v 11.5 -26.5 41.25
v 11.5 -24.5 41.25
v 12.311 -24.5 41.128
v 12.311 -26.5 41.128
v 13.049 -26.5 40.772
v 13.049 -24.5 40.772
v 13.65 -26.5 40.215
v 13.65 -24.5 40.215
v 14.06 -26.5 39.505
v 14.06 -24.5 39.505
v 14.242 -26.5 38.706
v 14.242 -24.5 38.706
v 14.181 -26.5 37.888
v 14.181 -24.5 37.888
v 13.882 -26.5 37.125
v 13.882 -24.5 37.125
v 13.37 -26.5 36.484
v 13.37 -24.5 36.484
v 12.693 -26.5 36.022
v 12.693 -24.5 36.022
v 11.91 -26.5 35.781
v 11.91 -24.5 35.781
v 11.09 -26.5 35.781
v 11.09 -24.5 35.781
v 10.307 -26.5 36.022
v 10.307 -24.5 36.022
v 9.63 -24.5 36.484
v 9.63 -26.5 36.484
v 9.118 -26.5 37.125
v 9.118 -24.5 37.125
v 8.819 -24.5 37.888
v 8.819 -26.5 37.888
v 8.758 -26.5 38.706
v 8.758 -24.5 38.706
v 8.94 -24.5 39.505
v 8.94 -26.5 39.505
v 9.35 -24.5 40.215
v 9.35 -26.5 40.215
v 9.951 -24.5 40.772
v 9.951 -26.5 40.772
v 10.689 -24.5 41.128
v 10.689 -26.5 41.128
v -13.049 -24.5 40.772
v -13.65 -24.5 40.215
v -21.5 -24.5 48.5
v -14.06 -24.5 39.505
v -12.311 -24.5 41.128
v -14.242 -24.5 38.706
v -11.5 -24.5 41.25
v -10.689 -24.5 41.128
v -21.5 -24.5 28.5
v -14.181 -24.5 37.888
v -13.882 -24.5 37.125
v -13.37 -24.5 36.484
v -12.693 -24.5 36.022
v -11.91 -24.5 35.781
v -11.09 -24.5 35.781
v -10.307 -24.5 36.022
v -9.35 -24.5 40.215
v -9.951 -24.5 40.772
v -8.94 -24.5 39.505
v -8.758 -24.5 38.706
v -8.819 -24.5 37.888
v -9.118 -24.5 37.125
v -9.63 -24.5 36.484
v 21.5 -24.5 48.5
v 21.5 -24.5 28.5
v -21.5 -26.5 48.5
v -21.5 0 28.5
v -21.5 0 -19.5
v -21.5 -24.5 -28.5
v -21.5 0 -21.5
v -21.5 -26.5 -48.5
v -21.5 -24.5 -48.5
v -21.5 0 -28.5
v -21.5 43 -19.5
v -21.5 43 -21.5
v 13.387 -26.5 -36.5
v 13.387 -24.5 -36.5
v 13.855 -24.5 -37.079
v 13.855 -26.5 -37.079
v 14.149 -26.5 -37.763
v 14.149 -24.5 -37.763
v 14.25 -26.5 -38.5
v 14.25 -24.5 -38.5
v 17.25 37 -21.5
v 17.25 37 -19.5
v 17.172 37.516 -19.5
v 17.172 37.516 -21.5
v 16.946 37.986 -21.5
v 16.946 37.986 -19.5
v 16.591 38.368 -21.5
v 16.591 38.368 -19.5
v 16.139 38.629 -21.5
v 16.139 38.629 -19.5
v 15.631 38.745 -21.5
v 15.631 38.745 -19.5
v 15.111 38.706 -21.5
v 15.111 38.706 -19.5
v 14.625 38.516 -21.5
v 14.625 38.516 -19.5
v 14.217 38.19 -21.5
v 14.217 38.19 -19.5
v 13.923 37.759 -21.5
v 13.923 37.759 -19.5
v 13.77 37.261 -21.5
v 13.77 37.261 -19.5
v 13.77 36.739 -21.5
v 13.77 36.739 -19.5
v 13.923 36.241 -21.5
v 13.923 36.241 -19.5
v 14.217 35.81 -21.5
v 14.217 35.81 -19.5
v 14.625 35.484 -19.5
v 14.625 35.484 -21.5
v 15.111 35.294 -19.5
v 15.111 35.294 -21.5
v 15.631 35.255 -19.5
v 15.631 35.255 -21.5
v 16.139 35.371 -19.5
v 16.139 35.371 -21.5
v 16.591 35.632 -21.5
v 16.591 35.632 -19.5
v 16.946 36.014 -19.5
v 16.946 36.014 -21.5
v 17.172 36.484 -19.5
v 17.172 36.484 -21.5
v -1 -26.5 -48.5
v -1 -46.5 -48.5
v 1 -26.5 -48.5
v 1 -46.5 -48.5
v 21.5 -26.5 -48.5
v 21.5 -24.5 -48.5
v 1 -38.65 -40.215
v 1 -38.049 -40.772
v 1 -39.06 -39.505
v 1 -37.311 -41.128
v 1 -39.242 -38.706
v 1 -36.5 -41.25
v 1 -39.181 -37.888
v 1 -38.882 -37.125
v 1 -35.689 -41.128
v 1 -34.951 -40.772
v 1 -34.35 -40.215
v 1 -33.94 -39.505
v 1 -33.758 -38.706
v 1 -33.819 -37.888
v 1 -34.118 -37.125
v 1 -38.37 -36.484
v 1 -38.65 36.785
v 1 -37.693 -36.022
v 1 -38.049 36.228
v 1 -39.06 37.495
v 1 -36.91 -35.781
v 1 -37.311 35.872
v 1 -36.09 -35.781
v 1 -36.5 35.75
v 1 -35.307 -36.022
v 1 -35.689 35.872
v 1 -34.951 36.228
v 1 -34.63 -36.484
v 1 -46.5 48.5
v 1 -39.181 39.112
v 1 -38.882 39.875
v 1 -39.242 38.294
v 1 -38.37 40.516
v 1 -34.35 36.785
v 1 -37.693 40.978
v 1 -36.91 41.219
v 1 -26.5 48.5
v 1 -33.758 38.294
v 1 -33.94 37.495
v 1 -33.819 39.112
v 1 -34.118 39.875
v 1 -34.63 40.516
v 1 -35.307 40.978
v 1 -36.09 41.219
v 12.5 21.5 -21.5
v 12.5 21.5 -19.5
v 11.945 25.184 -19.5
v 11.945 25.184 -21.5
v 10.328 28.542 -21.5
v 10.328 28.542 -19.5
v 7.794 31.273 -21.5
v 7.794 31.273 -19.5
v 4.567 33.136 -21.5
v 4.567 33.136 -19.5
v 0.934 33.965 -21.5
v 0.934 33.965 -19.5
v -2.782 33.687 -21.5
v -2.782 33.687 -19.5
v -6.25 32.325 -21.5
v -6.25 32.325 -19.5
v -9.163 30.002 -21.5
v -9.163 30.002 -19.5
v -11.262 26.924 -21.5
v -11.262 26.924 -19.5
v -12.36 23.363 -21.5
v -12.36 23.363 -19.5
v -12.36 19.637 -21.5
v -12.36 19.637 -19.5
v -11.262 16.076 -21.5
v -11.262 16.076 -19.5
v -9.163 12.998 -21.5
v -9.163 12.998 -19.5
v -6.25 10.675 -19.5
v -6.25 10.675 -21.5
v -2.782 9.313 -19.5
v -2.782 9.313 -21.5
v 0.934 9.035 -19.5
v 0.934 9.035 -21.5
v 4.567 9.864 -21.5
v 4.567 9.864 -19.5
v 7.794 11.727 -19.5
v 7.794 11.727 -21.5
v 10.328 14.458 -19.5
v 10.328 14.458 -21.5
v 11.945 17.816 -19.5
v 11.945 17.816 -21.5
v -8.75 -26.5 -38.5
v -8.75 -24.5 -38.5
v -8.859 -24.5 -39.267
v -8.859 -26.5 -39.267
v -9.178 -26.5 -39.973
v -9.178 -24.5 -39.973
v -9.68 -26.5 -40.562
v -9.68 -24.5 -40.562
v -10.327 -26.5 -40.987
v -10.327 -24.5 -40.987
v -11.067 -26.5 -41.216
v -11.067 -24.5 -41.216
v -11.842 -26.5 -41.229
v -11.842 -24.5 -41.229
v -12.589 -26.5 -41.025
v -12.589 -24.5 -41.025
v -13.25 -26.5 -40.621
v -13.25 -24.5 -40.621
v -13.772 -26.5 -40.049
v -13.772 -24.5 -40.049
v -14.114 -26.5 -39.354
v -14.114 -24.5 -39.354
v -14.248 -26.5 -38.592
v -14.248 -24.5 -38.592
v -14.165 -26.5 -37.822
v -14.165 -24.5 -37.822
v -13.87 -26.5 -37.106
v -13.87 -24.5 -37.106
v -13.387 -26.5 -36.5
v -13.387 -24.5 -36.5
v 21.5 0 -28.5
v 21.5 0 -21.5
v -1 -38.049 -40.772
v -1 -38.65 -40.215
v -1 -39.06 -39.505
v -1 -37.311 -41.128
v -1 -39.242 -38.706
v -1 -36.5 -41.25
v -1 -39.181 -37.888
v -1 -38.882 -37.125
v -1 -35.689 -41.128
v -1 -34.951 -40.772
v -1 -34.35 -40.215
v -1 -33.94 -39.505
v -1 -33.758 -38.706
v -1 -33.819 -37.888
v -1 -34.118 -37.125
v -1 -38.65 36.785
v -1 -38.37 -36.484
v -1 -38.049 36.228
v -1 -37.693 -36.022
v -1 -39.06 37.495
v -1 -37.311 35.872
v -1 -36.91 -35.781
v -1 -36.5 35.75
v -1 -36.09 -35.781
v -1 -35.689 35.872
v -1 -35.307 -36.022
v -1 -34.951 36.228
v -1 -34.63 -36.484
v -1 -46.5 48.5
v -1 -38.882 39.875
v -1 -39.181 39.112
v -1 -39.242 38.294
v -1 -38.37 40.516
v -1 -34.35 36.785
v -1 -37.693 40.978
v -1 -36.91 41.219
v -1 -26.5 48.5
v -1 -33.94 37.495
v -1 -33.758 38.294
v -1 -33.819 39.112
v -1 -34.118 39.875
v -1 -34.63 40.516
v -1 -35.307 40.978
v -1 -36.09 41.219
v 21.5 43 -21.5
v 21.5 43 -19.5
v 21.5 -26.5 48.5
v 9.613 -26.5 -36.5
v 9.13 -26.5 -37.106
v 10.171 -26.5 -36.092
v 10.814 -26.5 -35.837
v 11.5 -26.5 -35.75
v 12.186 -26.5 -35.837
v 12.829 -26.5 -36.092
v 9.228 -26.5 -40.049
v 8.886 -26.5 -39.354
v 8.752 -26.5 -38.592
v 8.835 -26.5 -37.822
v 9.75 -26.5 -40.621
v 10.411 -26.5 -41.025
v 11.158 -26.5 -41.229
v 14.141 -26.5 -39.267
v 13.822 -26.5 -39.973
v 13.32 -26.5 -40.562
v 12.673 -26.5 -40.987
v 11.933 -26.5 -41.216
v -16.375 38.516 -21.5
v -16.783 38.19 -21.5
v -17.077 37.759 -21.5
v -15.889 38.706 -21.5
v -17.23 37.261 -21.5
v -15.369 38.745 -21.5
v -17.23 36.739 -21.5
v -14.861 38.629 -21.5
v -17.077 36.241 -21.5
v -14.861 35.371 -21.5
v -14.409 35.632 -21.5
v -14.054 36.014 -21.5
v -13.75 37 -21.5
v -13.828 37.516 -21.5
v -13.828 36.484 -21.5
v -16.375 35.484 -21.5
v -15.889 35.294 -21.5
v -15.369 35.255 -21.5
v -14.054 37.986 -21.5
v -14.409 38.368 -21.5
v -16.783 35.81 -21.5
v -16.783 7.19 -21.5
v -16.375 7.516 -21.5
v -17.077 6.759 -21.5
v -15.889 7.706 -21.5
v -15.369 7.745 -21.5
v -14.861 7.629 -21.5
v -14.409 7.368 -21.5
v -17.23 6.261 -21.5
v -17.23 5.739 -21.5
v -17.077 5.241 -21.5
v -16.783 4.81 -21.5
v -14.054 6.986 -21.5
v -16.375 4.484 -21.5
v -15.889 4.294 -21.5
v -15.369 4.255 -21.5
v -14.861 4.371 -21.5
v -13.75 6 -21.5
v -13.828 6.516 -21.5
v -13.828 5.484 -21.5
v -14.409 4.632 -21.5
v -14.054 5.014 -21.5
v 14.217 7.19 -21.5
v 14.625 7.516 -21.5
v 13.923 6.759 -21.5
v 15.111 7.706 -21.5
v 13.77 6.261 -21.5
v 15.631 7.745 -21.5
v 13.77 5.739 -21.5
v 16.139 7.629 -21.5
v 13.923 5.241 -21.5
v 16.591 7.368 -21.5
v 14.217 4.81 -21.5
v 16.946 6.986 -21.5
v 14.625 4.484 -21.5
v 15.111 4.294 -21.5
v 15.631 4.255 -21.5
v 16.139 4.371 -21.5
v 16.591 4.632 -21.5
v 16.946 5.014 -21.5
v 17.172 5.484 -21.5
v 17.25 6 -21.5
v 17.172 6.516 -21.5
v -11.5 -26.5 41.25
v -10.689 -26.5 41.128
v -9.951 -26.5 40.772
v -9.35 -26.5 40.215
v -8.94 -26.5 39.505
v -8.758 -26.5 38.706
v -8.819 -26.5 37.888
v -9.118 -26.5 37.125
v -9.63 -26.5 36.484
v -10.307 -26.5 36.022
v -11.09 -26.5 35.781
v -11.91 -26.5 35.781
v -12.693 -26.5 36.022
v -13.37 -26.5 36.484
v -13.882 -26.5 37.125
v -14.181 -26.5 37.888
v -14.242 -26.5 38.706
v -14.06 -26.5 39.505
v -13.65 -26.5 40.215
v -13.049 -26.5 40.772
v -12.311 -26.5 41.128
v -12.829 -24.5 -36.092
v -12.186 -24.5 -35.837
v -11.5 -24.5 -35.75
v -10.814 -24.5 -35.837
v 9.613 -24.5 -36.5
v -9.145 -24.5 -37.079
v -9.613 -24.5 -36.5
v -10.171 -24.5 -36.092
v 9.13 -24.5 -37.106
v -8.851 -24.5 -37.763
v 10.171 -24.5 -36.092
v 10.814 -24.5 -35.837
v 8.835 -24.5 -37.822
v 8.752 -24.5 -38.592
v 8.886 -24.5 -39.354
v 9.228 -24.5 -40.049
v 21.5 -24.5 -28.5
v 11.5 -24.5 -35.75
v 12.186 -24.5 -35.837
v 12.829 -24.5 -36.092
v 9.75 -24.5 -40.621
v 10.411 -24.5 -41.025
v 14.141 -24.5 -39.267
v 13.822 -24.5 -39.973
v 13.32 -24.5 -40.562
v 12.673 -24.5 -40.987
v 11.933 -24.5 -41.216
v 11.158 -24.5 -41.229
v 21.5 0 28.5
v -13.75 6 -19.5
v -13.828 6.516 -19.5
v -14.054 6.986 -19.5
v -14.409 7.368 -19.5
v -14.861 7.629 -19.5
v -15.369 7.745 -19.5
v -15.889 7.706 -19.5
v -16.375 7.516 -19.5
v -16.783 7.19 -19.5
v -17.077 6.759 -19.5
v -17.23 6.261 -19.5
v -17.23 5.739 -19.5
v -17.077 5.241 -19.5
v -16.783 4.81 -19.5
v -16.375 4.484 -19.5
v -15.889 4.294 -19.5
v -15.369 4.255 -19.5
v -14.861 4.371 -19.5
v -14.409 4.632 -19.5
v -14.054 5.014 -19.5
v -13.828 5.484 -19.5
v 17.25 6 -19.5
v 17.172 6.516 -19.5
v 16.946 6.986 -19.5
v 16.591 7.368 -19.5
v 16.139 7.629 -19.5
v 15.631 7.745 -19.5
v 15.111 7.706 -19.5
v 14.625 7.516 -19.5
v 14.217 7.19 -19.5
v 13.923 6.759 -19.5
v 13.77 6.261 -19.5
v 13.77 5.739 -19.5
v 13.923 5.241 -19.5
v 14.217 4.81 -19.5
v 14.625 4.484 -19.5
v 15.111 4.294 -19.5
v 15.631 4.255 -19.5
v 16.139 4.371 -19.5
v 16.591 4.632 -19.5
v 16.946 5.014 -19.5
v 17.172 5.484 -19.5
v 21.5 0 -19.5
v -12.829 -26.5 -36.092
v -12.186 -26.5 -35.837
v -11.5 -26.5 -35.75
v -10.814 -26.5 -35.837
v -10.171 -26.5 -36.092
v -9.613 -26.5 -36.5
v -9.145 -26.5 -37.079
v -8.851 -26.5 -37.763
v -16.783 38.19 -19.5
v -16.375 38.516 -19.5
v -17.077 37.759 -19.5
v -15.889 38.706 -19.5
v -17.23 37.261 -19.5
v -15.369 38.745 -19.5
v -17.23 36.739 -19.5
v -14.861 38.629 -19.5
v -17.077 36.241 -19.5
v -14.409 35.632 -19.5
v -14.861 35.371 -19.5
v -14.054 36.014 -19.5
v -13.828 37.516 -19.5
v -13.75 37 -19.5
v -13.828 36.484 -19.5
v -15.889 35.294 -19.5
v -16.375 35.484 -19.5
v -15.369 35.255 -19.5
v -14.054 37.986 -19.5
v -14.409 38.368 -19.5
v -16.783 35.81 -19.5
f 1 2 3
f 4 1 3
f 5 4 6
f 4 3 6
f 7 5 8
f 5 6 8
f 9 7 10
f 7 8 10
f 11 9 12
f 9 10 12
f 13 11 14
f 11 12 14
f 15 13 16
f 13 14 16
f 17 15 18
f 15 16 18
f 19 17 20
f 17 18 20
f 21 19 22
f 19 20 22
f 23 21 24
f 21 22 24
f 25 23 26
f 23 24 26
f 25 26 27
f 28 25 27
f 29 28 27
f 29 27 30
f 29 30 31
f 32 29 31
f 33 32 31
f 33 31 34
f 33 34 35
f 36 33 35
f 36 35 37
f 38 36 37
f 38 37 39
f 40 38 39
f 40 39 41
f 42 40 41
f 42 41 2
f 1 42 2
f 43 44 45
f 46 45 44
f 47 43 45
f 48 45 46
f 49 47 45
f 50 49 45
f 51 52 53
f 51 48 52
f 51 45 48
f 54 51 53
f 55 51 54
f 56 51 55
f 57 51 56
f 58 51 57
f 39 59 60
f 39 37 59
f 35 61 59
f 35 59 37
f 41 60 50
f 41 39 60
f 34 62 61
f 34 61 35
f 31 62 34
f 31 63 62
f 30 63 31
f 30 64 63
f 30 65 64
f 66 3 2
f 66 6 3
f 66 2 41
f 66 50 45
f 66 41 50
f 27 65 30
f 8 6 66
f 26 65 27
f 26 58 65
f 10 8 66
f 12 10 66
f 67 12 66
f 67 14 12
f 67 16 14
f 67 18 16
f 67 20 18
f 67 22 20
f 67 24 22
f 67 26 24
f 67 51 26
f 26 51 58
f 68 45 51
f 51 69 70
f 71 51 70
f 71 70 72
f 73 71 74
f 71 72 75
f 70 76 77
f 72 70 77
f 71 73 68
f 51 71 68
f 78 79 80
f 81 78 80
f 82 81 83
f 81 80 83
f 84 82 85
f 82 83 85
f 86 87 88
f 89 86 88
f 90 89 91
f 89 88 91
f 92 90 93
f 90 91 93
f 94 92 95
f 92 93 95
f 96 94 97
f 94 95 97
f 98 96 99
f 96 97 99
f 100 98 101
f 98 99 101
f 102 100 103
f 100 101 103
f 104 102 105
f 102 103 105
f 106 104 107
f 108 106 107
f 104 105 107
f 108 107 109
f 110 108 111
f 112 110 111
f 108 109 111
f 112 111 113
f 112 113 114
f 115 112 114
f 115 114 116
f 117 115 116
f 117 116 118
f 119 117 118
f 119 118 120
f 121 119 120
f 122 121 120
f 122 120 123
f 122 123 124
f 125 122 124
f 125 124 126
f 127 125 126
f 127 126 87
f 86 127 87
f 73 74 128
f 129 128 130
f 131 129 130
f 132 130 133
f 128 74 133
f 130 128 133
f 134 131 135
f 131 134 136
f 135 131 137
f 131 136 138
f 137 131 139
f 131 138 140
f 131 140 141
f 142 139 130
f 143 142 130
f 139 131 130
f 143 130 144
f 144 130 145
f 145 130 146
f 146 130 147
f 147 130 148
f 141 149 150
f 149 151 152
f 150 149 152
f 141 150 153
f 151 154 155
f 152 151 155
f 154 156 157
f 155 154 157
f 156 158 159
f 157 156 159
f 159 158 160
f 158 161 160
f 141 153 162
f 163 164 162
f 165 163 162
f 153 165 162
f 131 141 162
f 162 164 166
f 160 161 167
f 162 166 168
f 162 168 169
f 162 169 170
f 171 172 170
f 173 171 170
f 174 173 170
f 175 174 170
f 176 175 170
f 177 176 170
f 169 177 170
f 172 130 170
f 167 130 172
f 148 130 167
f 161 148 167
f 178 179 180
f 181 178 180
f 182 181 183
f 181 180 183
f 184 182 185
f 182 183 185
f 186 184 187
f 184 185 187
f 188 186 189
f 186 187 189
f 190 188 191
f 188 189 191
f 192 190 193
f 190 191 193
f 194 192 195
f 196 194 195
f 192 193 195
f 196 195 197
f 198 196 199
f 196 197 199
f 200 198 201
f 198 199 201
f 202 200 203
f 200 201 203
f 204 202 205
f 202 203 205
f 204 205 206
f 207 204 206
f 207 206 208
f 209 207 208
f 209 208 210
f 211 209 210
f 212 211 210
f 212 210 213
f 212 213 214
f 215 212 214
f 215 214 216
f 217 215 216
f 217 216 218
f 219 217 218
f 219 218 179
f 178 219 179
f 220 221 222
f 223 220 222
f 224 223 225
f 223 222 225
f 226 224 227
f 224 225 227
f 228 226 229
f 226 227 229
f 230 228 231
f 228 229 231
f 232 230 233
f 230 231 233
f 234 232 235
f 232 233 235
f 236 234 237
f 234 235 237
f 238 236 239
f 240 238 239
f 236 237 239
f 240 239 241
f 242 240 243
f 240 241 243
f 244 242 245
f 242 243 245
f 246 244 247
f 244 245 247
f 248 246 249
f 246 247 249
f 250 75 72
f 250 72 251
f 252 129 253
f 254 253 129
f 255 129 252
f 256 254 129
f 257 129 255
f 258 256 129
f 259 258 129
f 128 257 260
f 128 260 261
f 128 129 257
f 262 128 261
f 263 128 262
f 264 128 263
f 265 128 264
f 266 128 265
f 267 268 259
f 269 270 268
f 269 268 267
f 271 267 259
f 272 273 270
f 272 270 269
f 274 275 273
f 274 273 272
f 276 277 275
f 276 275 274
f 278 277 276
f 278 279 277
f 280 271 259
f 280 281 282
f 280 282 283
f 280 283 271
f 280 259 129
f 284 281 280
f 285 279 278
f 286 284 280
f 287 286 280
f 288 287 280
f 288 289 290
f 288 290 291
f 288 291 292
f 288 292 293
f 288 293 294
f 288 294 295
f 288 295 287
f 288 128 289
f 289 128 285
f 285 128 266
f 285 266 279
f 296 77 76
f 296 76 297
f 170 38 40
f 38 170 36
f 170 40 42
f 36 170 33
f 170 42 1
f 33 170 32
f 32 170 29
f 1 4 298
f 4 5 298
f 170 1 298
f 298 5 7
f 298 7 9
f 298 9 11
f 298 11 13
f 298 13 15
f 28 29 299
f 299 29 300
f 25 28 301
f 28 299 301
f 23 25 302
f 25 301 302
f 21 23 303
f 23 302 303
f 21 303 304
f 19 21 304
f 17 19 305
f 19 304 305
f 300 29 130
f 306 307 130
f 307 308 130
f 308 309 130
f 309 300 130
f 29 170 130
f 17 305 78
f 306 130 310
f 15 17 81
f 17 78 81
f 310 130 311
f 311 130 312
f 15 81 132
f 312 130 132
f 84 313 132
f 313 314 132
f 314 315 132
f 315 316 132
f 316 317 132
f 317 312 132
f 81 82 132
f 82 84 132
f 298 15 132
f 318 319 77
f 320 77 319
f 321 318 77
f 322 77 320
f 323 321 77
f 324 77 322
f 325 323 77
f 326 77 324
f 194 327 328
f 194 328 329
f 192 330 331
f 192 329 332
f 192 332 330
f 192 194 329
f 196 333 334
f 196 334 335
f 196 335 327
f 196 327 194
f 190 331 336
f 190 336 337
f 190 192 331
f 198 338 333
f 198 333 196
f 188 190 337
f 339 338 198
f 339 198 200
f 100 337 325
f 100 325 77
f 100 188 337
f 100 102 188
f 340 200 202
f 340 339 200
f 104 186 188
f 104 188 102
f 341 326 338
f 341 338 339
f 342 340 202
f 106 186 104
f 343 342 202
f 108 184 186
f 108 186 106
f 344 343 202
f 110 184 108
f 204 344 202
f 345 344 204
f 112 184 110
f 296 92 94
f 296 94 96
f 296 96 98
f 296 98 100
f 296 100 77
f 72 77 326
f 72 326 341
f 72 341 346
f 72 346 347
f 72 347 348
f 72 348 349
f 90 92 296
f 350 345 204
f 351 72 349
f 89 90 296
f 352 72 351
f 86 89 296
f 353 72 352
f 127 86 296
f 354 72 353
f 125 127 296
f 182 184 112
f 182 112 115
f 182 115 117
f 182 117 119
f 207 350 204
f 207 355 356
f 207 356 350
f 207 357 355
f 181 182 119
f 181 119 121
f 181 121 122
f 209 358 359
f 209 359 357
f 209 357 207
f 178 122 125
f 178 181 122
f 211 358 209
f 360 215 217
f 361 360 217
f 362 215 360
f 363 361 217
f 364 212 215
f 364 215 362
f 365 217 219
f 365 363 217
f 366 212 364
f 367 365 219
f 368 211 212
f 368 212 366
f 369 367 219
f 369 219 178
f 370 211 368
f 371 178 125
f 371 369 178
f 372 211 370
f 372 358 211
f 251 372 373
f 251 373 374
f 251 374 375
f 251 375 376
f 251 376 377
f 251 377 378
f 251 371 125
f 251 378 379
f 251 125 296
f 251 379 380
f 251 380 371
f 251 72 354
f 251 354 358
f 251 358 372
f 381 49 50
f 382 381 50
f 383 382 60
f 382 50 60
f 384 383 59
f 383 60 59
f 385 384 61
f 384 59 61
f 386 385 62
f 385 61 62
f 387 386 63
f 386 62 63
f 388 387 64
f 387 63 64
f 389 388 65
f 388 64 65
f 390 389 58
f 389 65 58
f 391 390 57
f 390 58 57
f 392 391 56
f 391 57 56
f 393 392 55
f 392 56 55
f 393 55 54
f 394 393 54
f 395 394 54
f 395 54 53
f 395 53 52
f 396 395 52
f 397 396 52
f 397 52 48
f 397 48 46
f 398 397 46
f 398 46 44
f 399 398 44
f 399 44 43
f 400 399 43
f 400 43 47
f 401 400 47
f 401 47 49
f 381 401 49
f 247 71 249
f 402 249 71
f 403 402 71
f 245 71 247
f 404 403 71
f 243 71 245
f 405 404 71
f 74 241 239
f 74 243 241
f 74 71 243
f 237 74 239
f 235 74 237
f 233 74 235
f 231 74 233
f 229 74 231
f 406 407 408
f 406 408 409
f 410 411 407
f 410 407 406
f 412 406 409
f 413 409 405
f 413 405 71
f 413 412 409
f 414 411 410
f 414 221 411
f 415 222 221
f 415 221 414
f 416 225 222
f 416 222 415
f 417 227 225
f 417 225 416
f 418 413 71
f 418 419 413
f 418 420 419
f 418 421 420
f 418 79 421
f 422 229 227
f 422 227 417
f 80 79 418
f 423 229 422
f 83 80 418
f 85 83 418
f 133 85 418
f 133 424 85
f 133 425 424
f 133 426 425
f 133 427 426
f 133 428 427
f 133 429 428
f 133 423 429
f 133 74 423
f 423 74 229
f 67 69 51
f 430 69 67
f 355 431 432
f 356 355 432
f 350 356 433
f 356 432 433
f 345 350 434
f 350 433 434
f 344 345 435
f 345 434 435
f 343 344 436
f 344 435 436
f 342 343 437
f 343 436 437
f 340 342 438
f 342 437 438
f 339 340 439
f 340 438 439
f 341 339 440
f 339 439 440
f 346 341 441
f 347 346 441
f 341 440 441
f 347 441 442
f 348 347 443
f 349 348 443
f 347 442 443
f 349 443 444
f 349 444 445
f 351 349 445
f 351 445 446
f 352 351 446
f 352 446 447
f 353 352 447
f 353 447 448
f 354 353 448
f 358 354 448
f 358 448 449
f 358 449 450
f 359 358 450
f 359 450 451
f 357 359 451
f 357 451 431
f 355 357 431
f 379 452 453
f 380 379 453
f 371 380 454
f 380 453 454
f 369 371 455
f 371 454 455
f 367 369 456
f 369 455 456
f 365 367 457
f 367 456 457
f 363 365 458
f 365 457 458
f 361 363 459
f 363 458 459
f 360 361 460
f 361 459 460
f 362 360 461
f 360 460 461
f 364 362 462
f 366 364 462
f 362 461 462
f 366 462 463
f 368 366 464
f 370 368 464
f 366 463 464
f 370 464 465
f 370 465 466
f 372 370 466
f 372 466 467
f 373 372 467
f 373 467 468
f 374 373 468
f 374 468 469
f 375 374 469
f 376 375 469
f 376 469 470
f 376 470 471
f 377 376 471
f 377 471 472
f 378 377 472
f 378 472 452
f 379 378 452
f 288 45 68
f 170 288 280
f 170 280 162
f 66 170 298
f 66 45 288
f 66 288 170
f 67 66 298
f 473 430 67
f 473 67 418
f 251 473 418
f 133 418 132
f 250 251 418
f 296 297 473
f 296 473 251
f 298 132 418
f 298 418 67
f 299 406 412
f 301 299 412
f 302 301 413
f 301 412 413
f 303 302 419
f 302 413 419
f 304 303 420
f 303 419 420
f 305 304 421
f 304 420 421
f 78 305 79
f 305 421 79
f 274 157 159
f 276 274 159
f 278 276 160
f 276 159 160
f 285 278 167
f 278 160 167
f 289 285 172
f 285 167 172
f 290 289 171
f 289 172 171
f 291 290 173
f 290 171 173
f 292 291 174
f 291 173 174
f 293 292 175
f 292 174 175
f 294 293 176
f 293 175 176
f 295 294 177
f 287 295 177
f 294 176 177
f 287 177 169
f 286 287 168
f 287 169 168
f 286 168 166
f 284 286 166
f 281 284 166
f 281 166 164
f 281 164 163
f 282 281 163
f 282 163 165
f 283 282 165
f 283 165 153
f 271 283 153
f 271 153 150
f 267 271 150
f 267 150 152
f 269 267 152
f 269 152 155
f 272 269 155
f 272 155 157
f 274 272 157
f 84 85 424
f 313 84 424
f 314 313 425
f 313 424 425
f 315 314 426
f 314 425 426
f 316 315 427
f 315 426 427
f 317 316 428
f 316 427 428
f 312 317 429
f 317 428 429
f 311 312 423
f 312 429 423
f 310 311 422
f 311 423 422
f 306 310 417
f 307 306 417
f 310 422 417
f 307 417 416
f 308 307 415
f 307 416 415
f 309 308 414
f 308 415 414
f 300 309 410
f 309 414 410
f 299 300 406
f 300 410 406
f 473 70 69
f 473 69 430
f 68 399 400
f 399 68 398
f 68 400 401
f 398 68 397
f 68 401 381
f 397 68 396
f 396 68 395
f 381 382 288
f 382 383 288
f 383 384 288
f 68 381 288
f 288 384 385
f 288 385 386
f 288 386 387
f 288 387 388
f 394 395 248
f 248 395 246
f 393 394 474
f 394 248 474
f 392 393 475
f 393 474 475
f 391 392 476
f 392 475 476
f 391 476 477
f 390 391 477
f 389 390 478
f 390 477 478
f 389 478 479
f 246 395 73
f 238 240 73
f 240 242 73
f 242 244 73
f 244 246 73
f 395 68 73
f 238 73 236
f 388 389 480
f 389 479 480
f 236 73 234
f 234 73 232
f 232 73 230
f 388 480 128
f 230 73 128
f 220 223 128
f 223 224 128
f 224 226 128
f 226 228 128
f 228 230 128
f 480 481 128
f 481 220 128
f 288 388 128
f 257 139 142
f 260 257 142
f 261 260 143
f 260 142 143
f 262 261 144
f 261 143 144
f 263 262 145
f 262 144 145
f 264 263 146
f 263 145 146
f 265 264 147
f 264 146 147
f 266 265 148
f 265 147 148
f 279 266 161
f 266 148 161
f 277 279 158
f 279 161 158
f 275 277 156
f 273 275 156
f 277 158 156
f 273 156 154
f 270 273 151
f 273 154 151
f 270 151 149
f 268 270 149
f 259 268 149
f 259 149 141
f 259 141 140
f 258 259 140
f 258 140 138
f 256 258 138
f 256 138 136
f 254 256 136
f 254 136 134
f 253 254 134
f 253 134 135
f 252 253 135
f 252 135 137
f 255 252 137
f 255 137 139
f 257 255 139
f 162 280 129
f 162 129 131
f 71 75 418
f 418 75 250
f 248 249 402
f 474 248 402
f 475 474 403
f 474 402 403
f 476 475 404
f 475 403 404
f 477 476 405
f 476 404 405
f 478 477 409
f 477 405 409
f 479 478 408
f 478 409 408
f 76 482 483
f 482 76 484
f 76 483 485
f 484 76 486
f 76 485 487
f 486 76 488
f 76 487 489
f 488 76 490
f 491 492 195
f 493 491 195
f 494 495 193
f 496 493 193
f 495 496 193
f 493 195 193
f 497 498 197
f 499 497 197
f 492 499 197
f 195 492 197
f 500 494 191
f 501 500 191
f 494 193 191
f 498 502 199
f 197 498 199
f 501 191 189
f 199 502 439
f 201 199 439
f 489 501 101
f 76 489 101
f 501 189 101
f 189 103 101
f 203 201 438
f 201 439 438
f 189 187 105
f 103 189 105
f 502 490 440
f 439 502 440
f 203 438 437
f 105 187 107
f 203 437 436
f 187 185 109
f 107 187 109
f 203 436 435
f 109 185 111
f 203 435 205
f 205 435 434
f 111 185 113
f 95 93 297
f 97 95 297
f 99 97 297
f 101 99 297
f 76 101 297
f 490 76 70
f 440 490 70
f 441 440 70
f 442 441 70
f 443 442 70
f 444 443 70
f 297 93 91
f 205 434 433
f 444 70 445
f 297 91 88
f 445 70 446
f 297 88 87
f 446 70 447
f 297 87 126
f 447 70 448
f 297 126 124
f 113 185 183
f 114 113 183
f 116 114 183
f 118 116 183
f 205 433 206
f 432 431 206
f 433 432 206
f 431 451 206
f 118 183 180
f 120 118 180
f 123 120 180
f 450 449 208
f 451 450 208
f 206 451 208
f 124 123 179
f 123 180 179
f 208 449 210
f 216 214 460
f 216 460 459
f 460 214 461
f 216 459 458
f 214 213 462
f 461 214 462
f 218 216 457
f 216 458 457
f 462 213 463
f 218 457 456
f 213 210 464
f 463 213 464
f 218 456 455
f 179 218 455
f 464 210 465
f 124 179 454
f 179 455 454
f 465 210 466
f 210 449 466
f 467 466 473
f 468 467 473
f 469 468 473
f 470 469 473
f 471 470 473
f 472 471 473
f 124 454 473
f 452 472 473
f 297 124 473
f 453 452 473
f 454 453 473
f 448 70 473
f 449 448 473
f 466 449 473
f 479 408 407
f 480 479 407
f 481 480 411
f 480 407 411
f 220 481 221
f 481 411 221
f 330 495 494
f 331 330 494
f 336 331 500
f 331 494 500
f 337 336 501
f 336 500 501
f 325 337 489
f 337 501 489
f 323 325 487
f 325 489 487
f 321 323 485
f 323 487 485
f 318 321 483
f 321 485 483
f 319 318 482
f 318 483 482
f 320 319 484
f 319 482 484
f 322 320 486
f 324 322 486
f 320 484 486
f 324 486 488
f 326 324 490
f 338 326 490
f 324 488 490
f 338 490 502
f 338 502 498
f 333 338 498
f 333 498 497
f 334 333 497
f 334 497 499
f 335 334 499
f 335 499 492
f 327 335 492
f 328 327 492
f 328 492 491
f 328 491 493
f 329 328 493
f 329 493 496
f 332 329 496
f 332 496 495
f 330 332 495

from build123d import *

# Parameters (mm, degrees)
SKETCH1_W           = 43
SKETCH1_H           = 2
BOSS_EXTRUDE1_DEPTH = 43
SKETCH1_3_W         = 43
SKETCH1_3_H         = 97
BOSS_EXTRUDE2_DEPTH = 26.5
CUT_EXTRUDE1_REACH  = 85.278
SKETCH2_R           = 12.5
SKETCH2_R_2         = 1.75
CUT_EXTRUDE2_REACH  = 70.29
SKETCH1_4_R         = 2.75
SKETCH3_W           = 43
SKETCH3_H           = 20
CUT_EXTRUDE3_DEPTH  = 24.5
SKETCH4_W           = 2
SKETCH4_H           = 97
BOSS_EXTRUDE3_DEPTH = 20
CUT_EXTRUDE4_REACH  = 72.857
SKETCH5_R           = 2.75


with BuildPart() as part:
    # Sketch1 → Boss-Extrude1 (new body)
    with BuildSketch(Plane(origin=(0, 0, 0), x_dir=(1, 0, 0), z_dir=(0, 1, 0))):
        with Locations((0, 20.5)):
            Rectangle(SKETCH1_W, SKETCH1_H)
    extrude(amount=BOSS_EXTRUDE1_DEPTH)

    # Sketch1_3 → Boss-Extrude2 (add)
    with BuildSketch(Plane(origin=(0, 0, 0), x_dir=(1, 0, 0), z_dir=(0, 1, 0))):
        Rectangle(SKETCH1_3_W, SKETCH1_3_H)
    extrude(amount=-BOSS_EXTRUDE2_DEPTH)

    # Sketch2 → Cut-Extrude1 (cut, up to next)
    with BuildSketch(Plane.XY.offset(-19.5), mode=Mode.PRIVATE) as cut_extrude1_sk1:
        with Locations((0, 21.5)):
            Circle(SKETCH2_R)
    cut_extrude1_tool1 = extrude(cut_extrude1_sk1.sketch, amount=-CUT_EXTRUDE1_REACH, mode=Mode.PRIVATE) & part.part
    # Sketch2 → Cut-Extrude1 (cut, up to next)
    with BuildSketch(Plane.XY.offset(-19.5), mode=Mode.PRIVATE) as cut_extrude1_sk2:
        with Locations((-15.5, 37)):
            Circle(SKETCH2_R_2)
    cut_extrude1_tool2 = extrude(cut_extrude1_sk2.sketch, amount=-CUT_EXTRUDE1_REACH, mode=Mode.PRIVATE) & part.part
    # Sketch2 → Cut-Extrude1 (cut, up to next)
    with BuildSketch(Plane.XY.offset(-19.5), mode=Mode.PRIVATE) as cut_extrude1_sk3:
        with Locations((15.5, 37)):
            Circle(SKETCH2_R_2)
    cut_extrude1_tool3 = extrude(cut_extrude1_sk3.sketch, amount=-CUT_EXTRUDE1_REACH, mode=Mode.PRIVATE) & part.part
    # Sketch2 → Cut-Extrude1 (cut, up to next)
    with BuildSketch(Plane.XY.offset(-19.5), mode=Mode.PRIVATE) as cut_extrude1_sk4:
        with Locations((15.5, 6)):
            Circle(SKETCH2_R_2)
    cut_extrude1_tool4 = extrude(cut_extrude1_sk4.sketch, amount=-CUT_EXTRUDE1_REACH, mode=Mode.PRIVATE) & part.part
    # Sketch2 → Cut-Extrude1 (cut, up to next)
    with BuildSketch(Plane.XY.offset(-19.5), mode=Mode.PRIVATE) as cut_extrude1_sk5:
        with Locations((-15.5, 6)):
            Circle(SKETCH2_R_2)
    cut_extrude1_tool5 = extrude(cut_extrude1_sk5.sketch, amount=-CUT_EXTRUDE1_REACH, mode=Mode.PRIVATE) & part.part
    add(cut_extrude1_tool1.solids().sort_by_distance((0, 21.5, -19.5))[0], mode=Mode.SUBTRACT)
    add(cut_extrude1_tool2.solids().sort_by_distance((-15.5, 37, -19.5))[0], mode=Mode.SUBTRACT)
    add(cut_extrude1_tool3.solids().sort_by_distance((15.5, 37, -19.5))[0], mode=Mode.SUBTRACT)
    add(cut_extrude1_tool4.solids().sort_by_distance((15.5, 6, -19.5))[0], mode=Mode.SUBTRACT)
    add(cut_extrude1_tool5.solids().sort_by_distance((-15.5, 6, -19.5))[0], mode=Mode.SUBTRACT)

    # Sketch1_4 → Cut-Extrude2 (cut, up to next)
    with BuildSketch(Plane(origin=(0, 0, 0), x_dir=(1, 0, 0), z_dir=(0, 1, 0)), mode=Mode.PRIVATE) as cut_extrude2_sk1:
        with Locations(Location((-11.5, -38.5, 0), (0, 0, 270))):
            Circle(SKETCH1_4_R)
    cut_extrude2_tool1 = extrude(cut_extrude2_sk1.sketch, amount=-CUT_EXTRUDE2_REACH, mode=Mode.PRIVATE) & part.part
    # Sketch1_4 → Cut-Extrude2 (cut, up to next)
    with BuildSketch(Plane(origin=(0, 0, 0), x_dir=(1, 0, 0), z_dir=(0, 1, 0)), mode=Mode.PRIVATE) as cut_extrude2_sk2:
        with Locations(Location((11.5, -38.5, 0), (0, 0, 270))):
            Circle(SKETCH1_4_R)
    cut_extrude2_tool2 = extrude(cut_extrude2_sk2.sketch, amount=-CUT_EXTRUDE2_REACH, mode=Mode.PRIVATE) & part.part
    # Sketch1_4 → Cut-Extrude2 (cut, up to next)
    with BuildSketch(Plane(origin=(0, 0, 0), x_dir=(1, 0, 0), z_dir=(0, 1, 0)), mode=Mode.PRIVATE) as cut_extrude2_sk3:
        with BuildLine():
            ThreePointArc((-8.75, 38.5), (-12.589033706, 41.025174368), (-13.387458609, 36.5))
            Line((-13.387458609, 36.5), (-9.612541391, 36.5))
            ThreePointArc((-9.612541391, 36.5), (-8.974825632, 37.410966294), (-8.75, 38.5))
        make_face()
    cut_extrude2_tool3 = extrude(cut_extrude2_sk3.sketch, amount=-CUT_EXTRUDE2_REACH, mode=Mode.PRIVATE) & part.part
    # Sketch1_4 → Cut-Extrude2 (cut, up to next)
    with BuildSketch(Plane(origin=(0, 0, 0), x_dir=(1, 0, 0), z_dir=(0, 1, 0)), mode=Mode.PRIVATE) as cut_extrude2_sk4:
        with BuildLine():
            Line((-9.612541391, 36.5), (-13.387458609, 36.5))
            ThreePointArc((-13.387458609, 36.5), (-11.5, 35.75), (-9.612541391, 36.5))
        make_face()
    cut_extrude2_tool4 = extrude(cut_extrude2_sk4.sketch, amount=-CUT_EXTRUDE2_REACH, mode=Mode.PRIVATE) & part.part
    # Sketch1_4 → Cut-Extrude2 (cut, up to next)
    with BuildSketch(Plane(origin=(0, 0, 0), x_dir=(1, 0, 0), z_dir=(0, 1, 0)), mode=Mode.PRIVATE) as cut_extrude2_sk5:
        with BuildLine():
            ThreePointArc((9.612541391, 36.5), (11.5, 35.75), (13.387458609, 36.5))
            Line((13.387458609, 36.5), (9.612541391, 36.5))
        make_face()
    cut_extrude2_tool5 = extrude(cut_extrude2_sk5.sketch, amount=-CUT_EXTRUDE2_REACH, mode=Mode.PRIVATE) & part.part
    # Sketch1_4 → Cut-Extrude2 (cut, up to next)
    with BuildSketch(Plane(origin=(0, 0, 0), x_dir=(1, 0, 0), z_dir=(0, 1, 0)), mode=Mode.PRIVATE) as cut_extrude2_sk6:
        with BuildLine():
            Line((9.612541391, 36.5), (13.387458609, 36.5))
            ThreePointArc((13.387458609, 36.5), (14.025174368, 37.410966294), (14.25, 38.5))
            ThreePointArc((14.25, 38.5), (10.410966294, 41.025174368), (9.612541391, 36.5))
        make_face()
    cut_extrude2_tool6 = extrude(cut_extrude2_sk6.sketch, amount=-CUT_EXTRUDE2_REACH, mode=Mode.PRIVATE) & part.part
    # Sketch1_4 → Cut-Extrude2 (cut, up to next)
    with BuildSketch(Plane(origin=(0, 0, 0), x_dir=(1, 0, 0), z_dir=(0, 1, 0)), mode=Mode.PRIVATE) as cut_extrude2_sk7:
        with BuildLine():
            ThreePointArc((9.612541391, 36.5), (11.5, 35.75), (13.387458609, 36.5))
            Line((13.387458609, 36.5), (9.612541391, 36.5))
        make_face()
    cut_extrude2_tool7 = extrude(cut_extrude2_sk7.sketch, amount=-CUT_EXTRUDE2_REACH, mode=Mode.PRIVATE) & part.part
    # Sketch1_4 → Cut-Extrude2 (cut, up to next)
    with BuildSketch(Plane(origin=(0, 0, 0), x_dir=(1, 0, 0), z_dir=(0, 1, 0)), mode=Mode.PRIVATE) as cut_extrude2_sk8:
        with BuildLine():
            Line((9.612541391, 36.5), (13.387458609, 36.5))
            ThreePointArc((13.387458609, 36.5), (14.025174368, 37.410966294), (14.25, 38.5))
            ThreePointArc((14.25, 38.5), (10.410966294, 41.025174368), (9.612541391, 36.5))
        make_face()
    cut_extrude2_tool8 = extrude(cut_extrude2_sk8.sketch, amount=-CUT_EXTRUDE2_REACH, mode=Mode.PRIVATE) & part.part
    # Sketch1_4 → Cut-Extrude2 (cut, up to next)
    with BuildSketch(Plane(origin=(0, 0, 0), x_dir=(1, 0, 0), z_dir=(0, 1, 0)), mode=Mode.PRIVATE) as cut_extrude2_sk9:
        with BuildLine():
            ThreePointArc((-8.75, 38.5), (-12.589033706, 41.025174368), (-13.387458609, 36.5))
            Line((-13.387458609, 36.5), (-9.612541391, 36.5))
            ThreePointArc((-9.612541391, 36.5), (-8.974825632, 37.410966294), (-8.75, 38.5))
        make_face()
    cut_extrude2_tool9 = extrude(cut_extrude2_sk9.sketch, amount=-CUT_EXTRUDE2_REACH, mode=Mode.PRIVATE) & part.part
    # Sketch1_4 → Cut-Extrude2 (cut, up to next)
    with BuildSketch(Plane(origin=(0, 0, 0), x_dir=(1, 0, 0), z_dir=(0, 1, 0)), mode=Mode.PRIVATE) as cut_extrude2_sk10:
        with BuildLine():
            Line((-9.612541391, 36.5), (-13.387458609, 36.5))
            ThreePointArc((-13.387458609, 36.5), (-11.5, 35.75), (-9.612541391, 36.5))
        make_face()
    cut_extrude2_tool10 = extrude(cut_extrude2_sk10.sketch, amount=-CUT_EXTRUDE2_REACH, mode=Mode.PRIVATE) & part.part
    add(cut_extrude2_tool1.solids().sort_by_distance((-11.5, 0, 38.5))[0], mode=Mode.SUBTRACT)
    add(cut_extrude2_tool2.solids().sort_by_distance((11.5, 0, 38.5))[0], mode=Mode.SUBTRACT)
    add(cut_extrude2_tool3.solids().sort_by_distance((-11.5, 0, -38.705511))[0], mode=Mode.SUBTRACT)
    add(cut_extrude2_tool4.solids().sort_by_distance((-11.5, 0, -36.196191))[0], mode=Mode.SUBTRACT)
    add(cut_extrude2_tool5.solids().sort_by_distance((11.5, 0, -36.196191))[0], mode=Mode.SUBTRACT)
    add(cut_extrude2_tool6.solids().sort_by_distance((11.5, 0, -38.705511))[0], mode=Mode.SUBTRACT)
    add(cut_extrude2_tool7.solids().sort_by_distance((11.5, 0, -36.196191))[0], mode=Mode.SUBTRACT)
    add(cut_extrude2_tool8.solids().sort_by_distance((11.5, 0, -38.705511))[0], mode=Mode.SUBTRACT)
    add(cut_extrude2_tool9.solids().sort_by_distance((-11.5, 0, -38.705511))[0], mode=Mode.SUBTRACT)
    add(cut_extrude2_tool10.solids().sort_by_distance((-11.5, 0, -36.196191))[0], mode=Mode.SUBTRACT)

    # Sketch3 → Cut-Extrude3 (cut)
    with BuildSketch(Plane(origin=(0, 0, 0), x_dir=(1, 0, 0), z_dir=(0, 1, 0))):
        with Locations((0, -38.5)):
            Rectangle(SKETCH3_W, SKETCH3_H)
        with Locations((0, 38.5)):
            Rectangle(SKETCH3_W, SKETCH3_H)
    extrude(amount=-CUT_EXTRUDE3_DEPTH, mode=Mode.SUBTRACT)

    # Sketch4 → Boss-Extrude3 (add)
    with BuildSketch(Plane.XZ.offset(26.5)):
        Rectangle(SKETCH4_W, SKETCH4_H)
    extrude(amount=BOSS_EXTRUDE3_DEPTH)

    # Sketch5 → Cut-Extrude4 (cut, up to next)
    with BuildSketch(Plane(origin=(1, 0, 0), x_dir=(0, 0, -1), z_dir=(1, 0, 0)), mode=Mode.PRIVATE) as cut_extrude4_sk1:
        with Locations((38.5, -36.5)):
            Circle(SKETCH5_R)
    cut_extrude4_tool1 = extrude(cut_extrude4_sk1.sketch, amount=-CUT_EXTRUDE4_REACH, mode=Mode.PRIVATE) & part.part
    # Sketch5 → Cut-Extrude4 (cut, up to next)
    with BuildSketch(Plane(origin=(1, 0, 0), x_dir=(0, 0, -1), z_dir=(1, 0, 0)), mode=Mode.PRIVATE) as cut_extrude4_sk2:
        with Locations((-38.5, -36.5)):
            Circle(SKETCH5_R)
    cut_extrude4_tool2 = extrude(cut_extrude4_sk2.sketch, amount=-CUT_EXTRUDE4_REACH, mode=Mode.PRIVATE) & part.part
    add(cut_extrude4_tool1.solids().sort_by_distance((1, -36.5, -38.5))[0], mode=Mode.SUBTRACT)
    add(cut_extrude4_tool2.solids().sort_by_distance((1, -36.5, 38.5))[0], mode=Mode.SUBTRACT)


solid = part.part
